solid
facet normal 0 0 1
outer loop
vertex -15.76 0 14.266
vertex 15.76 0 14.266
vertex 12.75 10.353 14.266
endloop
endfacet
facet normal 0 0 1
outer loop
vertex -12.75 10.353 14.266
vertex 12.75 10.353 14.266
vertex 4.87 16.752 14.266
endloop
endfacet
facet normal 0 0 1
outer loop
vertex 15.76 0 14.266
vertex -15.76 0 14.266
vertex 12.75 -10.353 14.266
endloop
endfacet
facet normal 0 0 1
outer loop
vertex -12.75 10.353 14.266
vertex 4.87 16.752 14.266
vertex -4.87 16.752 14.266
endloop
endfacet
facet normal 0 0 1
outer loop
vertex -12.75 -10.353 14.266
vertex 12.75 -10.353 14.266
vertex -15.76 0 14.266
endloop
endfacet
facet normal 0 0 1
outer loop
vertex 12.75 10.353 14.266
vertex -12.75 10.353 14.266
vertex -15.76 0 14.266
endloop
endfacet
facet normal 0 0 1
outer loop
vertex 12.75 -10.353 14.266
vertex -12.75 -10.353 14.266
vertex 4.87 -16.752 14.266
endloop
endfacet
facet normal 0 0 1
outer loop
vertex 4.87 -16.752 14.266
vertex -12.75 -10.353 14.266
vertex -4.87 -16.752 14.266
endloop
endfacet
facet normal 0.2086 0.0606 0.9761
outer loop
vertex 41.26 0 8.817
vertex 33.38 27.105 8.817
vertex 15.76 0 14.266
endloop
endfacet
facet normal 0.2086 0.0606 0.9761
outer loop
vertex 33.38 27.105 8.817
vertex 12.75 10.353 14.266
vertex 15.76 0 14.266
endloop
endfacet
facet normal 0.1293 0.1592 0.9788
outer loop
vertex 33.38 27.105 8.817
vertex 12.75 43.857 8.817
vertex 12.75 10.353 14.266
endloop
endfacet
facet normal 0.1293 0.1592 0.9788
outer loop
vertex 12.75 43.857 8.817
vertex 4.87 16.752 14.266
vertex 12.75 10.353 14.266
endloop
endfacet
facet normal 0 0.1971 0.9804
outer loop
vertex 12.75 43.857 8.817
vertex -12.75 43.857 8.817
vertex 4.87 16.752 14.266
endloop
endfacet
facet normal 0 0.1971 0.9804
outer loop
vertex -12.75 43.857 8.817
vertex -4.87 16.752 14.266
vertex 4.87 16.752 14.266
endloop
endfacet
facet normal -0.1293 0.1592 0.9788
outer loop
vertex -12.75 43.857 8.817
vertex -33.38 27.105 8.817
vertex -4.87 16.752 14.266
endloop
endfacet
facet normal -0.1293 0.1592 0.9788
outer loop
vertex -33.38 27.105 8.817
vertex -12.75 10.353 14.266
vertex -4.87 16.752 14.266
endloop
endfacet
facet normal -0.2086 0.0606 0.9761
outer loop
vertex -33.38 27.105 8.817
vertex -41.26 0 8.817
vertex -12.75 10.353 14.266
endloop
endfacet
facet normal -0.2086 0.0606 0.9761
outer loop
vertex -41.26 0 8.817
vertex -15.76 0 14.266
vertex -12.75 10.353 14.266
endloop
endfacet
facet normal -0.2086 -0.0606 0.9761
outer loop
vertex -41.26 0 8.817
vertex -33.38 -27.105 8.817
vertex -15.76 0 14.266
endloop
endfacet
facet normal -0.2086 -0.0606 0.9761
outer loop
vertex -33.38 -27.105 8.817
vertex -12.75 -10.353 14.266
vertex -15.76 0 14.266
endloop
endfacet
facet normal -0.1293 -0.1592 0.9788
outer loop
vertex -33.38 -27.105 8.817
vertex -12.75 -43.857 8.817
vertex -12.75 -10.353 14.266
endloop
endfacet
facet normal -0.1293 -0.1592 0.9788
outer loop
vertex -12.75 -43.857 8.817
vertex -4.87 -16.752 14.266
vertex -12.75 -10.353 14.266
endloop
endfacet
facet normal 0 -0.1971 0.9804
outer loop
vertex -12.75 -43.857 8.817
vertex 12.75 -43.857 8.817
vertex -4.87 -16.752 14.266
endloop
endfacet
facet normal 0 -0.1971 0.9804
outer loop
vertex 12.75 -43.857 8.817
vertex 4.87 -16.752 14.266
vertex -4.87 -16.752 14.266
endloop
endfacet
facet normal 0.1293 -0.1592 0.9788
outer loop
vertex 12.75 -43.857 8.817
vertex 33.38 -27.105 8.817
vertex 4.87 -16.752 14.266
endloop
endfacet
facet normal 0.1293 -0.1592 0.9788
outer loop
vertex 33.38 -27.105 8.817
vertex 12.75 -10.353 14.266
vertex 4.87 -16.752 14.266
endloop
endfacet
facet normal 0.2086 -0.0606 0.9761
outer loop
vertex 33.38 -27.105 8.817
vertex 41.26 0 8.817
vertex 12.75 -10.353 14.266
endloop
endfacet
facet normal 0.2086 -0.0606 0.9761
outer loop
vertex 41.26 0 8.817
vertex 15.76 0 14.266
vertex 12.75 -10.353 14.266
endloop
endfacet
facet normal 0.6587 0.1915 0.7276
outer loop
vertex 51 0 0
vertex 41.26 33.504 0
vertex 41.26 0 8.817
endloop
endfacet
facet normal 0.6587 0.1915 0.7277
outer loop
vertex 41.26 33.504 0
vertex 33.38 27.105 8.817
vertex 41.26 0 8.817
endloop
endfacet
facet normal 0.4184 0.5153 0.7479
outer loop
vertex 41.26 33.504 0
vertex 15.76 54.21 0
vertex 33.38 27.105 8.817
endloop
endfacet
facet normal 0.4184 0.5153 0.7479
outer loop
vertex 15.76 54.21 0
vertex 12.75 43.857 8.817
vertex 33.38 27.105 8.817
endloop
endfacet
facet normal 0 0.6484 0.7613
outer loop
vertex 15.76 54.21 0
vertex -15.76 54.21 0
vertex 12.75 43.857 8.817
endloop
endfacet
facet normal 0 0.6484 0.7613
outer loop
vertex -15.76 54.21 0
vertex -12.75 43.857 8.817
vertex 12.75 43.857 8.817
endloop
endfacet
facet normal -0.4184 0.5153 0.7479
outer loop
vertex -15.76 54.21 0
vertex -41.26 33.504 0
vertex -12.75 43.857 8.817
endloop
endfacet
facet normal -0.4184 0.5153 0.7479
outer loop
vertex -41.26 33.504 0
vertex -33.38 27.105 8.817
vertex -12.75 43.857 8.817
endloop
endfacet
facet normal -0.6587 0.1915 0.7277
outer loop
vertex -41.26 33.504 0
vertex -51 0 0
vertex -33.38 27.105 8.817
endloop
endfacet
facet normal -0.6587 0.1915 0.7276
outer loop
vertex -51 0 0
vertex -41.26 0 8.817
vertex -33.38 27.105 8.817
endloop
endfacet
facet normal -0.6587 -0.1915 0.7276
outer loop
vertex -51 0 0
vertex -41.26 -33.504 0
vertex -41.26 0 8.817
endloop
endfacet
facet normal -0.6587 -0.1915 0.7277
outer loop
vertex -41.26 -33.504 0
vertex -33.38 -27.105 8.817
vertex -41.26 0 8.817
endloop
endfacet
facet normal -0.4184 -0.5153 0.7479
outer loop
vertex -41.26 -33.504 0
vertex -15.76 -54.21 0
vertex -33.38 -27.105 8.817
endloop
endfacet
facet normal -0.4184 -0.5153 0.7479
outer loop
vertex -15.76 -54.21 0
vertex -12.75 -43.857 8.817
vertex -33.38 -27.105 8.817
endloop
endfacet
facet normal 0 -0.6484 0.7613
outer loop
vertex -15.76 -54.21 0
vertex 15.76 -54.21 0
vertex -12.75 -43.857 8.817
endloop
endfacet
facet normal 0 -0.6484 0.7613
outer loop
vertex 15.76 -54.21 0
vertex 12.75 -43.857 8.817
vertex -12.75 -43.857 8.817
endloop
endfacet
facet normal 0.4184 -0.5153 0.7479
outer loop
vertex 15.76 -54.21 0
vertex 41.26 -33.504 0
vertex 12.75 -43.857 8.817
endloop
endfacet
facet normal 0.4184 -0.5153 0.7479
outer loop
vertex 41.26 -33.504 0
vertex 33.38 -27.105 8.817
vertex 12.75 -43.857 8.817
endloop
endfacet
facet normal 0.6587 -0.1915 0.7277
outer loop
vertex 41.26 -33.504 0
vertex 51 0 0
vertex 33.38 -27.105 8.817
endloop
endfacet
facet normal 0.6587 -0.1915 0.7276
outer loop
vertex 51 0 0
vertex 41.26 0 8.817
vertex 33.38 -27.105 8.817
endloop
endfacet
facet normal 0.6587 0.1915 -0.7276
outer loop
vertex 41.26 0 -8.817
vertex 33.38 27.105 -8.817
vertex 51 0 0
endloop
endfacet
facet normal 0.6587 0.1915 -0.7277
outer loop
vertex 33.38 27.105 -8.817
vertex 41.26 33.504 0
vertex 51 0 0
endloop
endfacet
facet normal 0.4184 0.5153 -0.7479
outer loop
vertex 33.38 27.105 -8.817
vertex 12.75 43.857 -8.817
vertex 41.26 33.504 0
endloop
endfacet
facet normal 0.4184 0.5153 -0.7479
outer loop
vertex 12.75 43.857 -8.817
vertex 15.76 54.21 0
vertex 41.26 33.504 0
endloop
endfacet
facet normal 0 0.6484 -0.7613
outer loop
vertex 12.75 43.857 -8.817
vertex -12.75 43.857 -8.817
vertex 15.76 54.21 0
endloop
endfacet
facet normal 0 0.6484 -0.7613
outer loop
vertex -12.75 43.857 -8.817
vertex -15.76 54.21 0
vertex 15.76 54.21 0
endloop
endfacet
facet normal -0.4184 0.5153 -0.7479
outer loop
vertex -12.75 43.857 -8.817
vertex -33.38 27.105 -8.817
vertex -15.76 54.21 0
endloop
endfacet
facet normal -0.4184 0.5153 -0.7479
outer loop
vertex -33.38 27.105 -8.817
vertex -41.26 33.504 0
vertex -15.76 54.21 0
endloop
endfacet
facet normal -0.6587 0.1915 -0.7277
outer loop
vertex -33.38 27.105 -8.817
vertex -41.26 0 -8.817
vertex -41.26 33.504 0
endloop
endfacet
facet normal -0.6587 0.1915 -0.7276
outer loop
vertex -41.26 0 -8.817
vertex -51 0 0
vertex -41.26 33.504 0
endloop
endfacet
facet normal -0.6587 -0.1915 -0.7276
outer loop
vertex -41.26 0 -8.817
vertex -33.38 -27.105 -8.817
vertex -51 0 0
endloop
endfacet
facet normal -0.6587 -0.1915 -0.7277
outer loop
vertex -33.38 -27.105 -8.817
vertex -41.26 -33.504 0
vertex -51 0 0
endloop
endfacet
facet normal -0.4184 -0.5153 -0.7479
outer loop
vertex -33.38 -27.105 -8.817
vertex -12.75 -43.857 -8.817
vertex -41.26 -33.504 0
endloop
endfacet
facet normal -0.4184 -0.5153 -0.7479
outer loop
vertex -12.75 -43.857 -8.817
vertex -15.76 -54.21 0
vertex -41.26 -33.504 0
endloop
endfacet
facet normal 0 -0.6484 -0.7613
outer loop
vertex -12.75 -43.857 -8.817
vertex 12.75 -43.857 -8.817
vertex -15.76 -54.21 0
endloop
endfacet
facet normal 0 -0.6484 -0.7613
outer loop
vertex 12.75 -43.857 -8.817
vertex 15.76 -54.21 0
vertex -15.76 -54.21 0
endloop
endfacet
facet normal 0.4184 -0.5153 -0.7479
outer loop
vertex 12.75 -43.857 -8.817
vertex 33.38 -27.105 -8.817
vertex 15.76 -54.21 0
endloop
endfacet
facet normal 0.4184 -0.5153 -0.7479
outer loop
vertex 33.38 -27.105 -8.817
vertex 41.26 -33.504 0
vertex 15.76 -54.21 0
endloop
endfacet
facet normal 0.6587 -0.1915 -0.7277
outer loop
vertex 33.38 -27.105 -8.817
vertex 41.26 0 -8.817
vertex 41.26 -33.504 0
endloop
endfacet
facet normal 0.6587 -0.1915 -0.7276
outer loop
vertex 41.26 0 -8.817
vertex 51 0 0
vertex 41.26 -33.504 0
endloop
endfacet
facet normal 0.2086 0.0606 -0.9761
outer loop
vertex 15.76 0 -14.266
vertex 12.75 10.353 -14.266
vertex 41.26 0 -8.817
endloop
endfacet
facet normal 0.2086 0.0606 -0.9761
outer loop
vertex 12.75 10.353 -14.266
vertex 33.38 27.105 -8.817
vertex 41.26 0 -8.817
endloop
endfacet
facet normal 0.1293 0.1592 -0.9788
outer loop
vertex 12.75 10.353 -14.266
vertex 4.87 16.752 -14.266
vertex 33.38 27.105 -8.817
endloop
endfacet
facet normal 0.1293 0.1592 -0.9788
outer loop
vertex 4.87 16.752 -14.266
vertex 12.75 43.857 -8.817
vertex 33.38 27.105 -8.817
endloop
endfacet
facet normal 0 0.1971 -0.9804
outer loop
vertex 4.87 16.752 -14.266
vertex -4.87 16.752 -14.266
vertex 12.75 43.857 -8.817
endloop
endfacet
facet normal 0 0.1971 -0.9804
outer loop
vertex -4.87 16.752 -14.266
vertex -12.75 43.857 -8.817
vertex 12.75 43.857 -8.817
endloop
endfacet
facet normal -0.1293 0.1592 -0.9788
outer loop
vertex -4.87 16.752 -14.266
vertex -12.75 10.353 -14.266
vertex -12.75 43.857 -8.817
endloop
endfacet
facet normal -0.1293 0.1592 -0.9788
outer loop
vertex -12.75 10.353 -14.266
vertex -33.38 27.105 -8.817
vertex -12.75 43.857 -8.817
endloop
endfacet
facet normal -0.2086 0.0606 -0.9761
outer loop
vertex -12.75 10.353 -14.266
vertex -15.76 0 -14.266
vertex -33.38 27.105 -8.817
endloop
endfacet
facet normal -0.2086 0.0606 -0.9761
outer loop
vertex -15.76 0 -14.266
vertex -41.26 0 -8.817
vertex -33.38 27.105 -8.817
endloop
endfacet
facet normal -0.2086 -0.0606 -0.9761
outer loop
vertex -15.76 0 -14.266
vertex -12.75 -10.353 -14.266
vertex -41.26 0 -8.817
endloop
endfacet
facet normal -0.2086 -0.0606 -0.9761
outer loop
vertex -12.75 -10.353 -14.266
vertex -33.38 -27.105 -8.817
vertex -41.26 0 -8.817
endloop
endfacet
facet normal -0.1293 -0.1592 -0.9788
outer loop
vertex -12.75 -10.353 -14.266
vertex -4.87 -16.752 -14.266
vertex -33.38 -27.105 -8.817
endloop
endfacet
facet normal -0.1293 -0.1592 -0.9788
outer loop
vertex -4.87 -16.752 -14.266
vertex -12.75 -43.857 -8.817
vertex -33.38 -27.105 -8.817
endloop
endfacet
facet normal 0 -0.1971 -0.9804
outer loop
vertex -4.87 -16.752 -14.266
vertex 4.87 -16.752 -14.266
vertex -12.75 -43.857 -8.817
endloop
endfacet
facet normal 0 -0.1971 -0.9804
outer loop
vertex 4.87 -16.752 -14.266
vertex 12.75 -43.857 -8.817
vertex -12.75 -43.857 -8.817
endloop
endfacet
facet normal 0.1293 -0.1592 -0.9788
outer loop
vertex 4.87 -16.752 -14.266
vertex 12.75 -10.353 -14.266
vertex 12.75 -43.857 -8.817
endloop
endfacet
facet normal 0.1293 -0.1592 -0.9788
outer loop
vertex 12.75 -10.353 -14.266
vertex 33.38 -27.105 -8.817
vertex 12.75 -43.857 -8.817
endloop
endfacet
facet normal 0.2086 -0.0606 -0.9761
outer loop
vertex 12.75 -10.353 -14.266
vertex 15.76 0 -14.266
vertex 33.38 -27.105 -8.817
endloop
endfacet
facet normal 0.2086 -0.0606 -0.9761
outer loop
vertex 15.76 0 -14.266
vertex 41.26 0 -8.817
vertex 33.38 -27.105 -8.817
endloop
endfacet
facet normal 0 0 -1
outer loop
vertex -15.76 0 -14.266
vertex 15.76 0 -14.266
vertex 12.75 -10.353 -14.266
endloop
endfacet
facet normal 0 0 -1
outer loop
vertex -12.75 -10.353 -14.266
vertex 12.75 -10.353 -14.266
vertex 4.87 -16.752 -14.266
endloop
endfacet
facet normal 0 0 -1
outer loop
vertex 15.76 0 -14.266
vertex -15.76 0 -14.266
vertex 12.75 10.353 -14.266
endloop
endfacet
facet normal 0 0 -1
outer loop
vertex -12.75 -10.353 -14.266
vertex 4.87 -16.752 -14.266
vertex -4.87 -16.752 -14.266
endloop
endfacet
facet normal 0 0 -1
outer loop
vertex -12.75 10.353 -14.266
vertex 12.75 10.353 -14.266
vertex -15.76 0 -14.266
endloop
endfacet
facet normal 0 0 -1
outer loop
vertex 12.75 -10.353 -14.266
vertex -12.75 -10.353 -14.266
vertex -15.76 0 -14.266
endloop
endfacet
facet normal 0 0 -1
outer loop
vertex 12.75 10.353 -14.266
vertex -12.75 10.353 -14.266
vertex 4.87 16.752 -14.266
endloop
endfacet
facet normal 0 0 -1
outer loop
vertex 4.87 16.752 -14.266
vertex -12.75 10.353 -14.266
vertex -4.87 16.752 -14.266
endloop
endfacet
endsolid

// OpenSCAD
// Generated by SolidPython 1.0.1 on 2020-07-29 00:46:53


scale(v = [17, 19, 5]) {
	sphere(r = 3);
}
/***********************************************
*********      SolidPython code:      **********
************************************************
 
# import packages: SolidPython
from solid import *
from solid.utils import *
from itertools import chain, combinations, permutations


class Resize:

    def __init__(self, scad_file):
        self.scad_file = scad_file
        #self.scad_file = import_scad(scad_file)
        # cone/cylinder param:
        self.r1 = 0
        self.r2 = 0
        self.h = 0
        # rectangular prism param:
        self.w = 0
        self.l = 0
        # ellipse param:
        self.r = 0

    # import OpenScad code (file name corresponds to shape)


    # classify shape + parameters
    def assign(self, param1, param2, param3):
        if self.scad_file == 'cone.scad':
            self.r1 = param1
            self.r2 = param2
            self.h = param3
        elif self.scad_file == 'cylinder.scad':
            self.r1 = param1
            self.r2 = param2
            self.h = param3
        elif self.scad_file == 'rectangularPrism.scad':
            self.h = param1
            self.l = param2
            self.w = param3
        else:
            self.r = param1
            self.h = param2

    # resize parameters
    def iterate(self):
        x = range(3, 20, 2)
        i = 1
        if self.scad_file == 'cone.scad':
            tempList = list(permutations(x, 2))
            for temp in tempList:
                param1 = temp[0]
                param2 = temp[1]
                filepath = 'produced_scad_files/' + 'cone' + str(param1) + '_' + str(param2) + '_' + '.scad'
                scad_render_to_file(cylinder(h=param1, r1=param2, r2=0), filepath)

        elif self.scad_file == 'cylinder.scad':
            tempList = list(permutations(x, 3))
            for temp in tempList:
                param1 = temp[0]
                param2 = temp[1]
                filepath = 'produced_scad_files/' + 'cylinder' + str(param1) + '_' + str(param2) + '_' + '.scad'
                scad_render_to_file(cylinder(h=param1, r1=param2, r2=param2), filepath)

        elif self.scad_file == 'rectangularPrism.scad':
            tempList = list(permutations(x, 3))
            for temp in tempList:
                param1 = temp[0]
                param2 = temp[1]
                param3 = temp[2]
                filepath = 'produced_scad_files/' + 'rectangularPrism' + str(param1) + '_' + str(param2) + '_' + str(
                    param3) + '.scad'
                scad_render_to_file(cube(size=(param1, param2, param3)), filepath)

        elif self.scad_file == 'ellipse.scad':
            tempList = list(permutations(x, 4))
            for temp in tempList:
                param1 = temp[0]
                param2 = temp[1]
                param3 = temp[2]
                param4 = temp[3]
                filepath = 'produced_scad_files/' + 'ellipse' + str(param1) + '_' + str(param2) + '_' + str(param3) + '_' + str(param4) + '.scad'
                scad_render_to_file(scale([param1, param2, param3])(sphere(r=param4)), filepath)

    def render_to_scadfile(self):
        scad_render_to_file(scad, 'example.scad') 
 
************************************************/
